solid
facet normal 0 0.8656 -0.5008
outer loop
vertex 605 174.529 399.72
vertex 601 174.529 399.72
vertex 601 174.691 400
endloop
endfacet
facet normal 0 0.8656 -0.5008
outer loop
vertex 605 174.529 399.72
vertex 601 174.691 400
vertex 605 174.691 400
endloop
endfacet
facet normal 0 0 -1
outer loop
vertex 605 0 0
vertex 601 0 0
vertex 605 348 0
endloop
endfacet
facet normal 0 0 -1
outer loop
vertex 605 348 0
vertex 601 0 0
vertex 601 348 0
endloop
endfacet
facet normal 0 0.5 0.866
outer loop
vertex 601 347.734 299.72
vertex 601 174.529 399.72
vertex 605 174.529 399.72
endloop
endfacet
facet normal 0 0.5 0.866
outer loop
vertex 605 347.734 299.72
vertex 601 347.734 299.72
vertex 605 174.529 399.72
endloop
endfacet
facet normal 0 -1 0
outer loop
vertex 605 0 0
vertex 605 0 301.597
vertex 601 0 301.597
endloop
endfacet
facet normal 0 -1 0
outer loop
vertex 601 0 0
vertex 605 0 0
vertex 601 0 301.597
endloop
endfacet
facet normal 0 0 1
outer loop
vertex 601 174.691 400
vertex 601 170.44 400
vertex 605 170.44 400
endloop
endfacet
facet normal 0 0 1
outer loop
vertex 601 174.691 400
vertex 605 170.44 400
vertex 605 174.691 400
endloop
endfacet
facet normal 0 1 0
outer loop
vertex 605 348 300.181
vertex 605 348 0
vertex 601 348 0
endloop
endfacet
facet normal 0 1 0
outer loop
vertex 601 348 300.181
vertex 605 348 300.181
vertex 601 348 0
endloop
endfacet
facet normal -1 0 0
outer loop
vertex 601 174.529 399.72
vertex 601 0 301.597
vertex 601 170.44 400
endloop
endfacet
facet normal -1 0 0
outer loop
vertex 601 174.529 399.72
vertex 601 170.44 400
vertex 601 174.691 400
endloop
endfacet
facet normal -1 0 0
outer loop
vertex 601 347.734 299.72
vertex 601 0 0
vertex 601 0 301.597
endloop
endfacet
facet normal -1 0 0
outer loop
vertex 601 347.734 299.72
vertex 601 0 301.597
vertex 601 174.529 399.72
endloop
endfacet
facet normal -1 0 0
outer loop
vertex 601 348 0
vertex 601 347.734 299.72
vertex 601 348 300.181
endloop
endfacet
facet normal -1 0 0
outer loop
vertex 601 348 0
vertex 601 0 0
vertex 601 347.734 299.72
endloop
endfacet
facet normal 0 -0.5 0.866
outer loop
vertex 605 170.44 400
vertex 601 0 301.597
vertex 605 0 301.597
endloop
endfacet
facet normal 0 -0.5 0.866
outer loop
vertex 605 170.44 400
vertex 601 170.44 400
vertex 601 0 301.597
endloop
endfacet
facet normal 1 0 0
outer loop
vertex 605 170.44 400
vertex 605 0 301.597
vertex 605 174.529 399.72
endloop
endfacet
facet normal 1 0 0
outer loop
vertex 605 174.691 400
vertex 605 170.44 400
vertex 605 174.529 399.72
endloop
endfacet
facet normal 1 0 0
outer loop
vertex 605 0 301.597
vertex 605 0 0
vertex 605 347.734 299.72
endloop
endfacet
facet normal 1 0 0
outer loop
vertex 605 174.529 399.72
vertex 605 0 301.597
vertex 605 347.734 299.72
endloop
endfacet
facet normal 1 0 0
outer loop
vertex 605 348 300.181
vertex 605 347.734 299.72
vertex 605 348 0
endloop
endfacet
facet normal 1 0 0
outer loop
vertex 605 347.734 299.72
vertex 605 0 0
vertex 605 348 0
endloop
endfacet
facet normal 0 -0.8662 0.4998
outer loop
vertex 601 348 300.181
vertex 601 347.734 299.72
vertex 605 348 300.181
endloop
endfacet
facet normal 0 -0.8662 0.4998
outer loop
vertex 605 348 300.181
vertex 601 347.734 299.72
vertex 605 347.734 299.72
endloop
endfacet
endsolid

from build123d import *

# Parameters (mm, degrees)
BOX006_W               = 18
BOX006_H               = 200
BOX006_DEPTH           = 87
BOX006_PLACEMENT_ANGLE = 30
BOX005_W               = 18
BOX005_H               = 200
BOX005_DEPTH           = 87
BOX005_PLACEMENT_ANGLE = 30
BOX004_W               = 348
BOX004_H               = 4
BOX004_DEPTH           = 400


with BuildPart() as box006:
    # Box006 → Box006 (new body)
    with BuildSketch(Plane.XY):
        with Locations((9, 100)):
            Rectangle(BOX006_W, BOX006_H)
    extrude(amount=BOX006_DEPTH)


with BuildPart() as box006_1:
    # Box006 placement: moved
    add(box006.part.moved(Location((598, 174.528857, 399.719854))).rotate(Axis((598, 174.528857, 399.719854), (-1, 0, 0)), BOX006_PLACEMENT_ANGLE))


with BuildPart() as glass_cut:
    # Box005 → Box005 (new body)
    with BuildSketch(Plane.XY):
        with Locations((9, 100)):
            Rectangle(BOX005_W, BOX005_H)
    extrude(amount=BOX005_DEPTH)


with BuildPart() as glass_cut_1:
    # Box005 placement: moved
    add(glass_cut.part.moved(Location((598, -0.25833, 301.447441))).rotate(Axis((598, -0.25833, 301.447441), (1, 0, 0)), BOX005_PLACEMENT_ANGLE))


with BuildPart() as glass_sides:
    # Box004 → Box004 (new body)
    with BuildSketch(Plane(origin=(605, 0, 0), x_dir=(0, 1, 0), z_dir=(0, 0, 1))):
        with Locations((174, 2)):
            Rectangle(BOX004_W, BOX004_H)
    extrude(amount=BOX004_DEPTH)

    # Cut: cut Glass cut 
    add(glass_cut_1.part, mode=Mode.SUBTRACT)

    # Cut001: cut Box006
    add(box006_1.part, mode=Mode.SUBTRACT)


solid = glass_sides.part
